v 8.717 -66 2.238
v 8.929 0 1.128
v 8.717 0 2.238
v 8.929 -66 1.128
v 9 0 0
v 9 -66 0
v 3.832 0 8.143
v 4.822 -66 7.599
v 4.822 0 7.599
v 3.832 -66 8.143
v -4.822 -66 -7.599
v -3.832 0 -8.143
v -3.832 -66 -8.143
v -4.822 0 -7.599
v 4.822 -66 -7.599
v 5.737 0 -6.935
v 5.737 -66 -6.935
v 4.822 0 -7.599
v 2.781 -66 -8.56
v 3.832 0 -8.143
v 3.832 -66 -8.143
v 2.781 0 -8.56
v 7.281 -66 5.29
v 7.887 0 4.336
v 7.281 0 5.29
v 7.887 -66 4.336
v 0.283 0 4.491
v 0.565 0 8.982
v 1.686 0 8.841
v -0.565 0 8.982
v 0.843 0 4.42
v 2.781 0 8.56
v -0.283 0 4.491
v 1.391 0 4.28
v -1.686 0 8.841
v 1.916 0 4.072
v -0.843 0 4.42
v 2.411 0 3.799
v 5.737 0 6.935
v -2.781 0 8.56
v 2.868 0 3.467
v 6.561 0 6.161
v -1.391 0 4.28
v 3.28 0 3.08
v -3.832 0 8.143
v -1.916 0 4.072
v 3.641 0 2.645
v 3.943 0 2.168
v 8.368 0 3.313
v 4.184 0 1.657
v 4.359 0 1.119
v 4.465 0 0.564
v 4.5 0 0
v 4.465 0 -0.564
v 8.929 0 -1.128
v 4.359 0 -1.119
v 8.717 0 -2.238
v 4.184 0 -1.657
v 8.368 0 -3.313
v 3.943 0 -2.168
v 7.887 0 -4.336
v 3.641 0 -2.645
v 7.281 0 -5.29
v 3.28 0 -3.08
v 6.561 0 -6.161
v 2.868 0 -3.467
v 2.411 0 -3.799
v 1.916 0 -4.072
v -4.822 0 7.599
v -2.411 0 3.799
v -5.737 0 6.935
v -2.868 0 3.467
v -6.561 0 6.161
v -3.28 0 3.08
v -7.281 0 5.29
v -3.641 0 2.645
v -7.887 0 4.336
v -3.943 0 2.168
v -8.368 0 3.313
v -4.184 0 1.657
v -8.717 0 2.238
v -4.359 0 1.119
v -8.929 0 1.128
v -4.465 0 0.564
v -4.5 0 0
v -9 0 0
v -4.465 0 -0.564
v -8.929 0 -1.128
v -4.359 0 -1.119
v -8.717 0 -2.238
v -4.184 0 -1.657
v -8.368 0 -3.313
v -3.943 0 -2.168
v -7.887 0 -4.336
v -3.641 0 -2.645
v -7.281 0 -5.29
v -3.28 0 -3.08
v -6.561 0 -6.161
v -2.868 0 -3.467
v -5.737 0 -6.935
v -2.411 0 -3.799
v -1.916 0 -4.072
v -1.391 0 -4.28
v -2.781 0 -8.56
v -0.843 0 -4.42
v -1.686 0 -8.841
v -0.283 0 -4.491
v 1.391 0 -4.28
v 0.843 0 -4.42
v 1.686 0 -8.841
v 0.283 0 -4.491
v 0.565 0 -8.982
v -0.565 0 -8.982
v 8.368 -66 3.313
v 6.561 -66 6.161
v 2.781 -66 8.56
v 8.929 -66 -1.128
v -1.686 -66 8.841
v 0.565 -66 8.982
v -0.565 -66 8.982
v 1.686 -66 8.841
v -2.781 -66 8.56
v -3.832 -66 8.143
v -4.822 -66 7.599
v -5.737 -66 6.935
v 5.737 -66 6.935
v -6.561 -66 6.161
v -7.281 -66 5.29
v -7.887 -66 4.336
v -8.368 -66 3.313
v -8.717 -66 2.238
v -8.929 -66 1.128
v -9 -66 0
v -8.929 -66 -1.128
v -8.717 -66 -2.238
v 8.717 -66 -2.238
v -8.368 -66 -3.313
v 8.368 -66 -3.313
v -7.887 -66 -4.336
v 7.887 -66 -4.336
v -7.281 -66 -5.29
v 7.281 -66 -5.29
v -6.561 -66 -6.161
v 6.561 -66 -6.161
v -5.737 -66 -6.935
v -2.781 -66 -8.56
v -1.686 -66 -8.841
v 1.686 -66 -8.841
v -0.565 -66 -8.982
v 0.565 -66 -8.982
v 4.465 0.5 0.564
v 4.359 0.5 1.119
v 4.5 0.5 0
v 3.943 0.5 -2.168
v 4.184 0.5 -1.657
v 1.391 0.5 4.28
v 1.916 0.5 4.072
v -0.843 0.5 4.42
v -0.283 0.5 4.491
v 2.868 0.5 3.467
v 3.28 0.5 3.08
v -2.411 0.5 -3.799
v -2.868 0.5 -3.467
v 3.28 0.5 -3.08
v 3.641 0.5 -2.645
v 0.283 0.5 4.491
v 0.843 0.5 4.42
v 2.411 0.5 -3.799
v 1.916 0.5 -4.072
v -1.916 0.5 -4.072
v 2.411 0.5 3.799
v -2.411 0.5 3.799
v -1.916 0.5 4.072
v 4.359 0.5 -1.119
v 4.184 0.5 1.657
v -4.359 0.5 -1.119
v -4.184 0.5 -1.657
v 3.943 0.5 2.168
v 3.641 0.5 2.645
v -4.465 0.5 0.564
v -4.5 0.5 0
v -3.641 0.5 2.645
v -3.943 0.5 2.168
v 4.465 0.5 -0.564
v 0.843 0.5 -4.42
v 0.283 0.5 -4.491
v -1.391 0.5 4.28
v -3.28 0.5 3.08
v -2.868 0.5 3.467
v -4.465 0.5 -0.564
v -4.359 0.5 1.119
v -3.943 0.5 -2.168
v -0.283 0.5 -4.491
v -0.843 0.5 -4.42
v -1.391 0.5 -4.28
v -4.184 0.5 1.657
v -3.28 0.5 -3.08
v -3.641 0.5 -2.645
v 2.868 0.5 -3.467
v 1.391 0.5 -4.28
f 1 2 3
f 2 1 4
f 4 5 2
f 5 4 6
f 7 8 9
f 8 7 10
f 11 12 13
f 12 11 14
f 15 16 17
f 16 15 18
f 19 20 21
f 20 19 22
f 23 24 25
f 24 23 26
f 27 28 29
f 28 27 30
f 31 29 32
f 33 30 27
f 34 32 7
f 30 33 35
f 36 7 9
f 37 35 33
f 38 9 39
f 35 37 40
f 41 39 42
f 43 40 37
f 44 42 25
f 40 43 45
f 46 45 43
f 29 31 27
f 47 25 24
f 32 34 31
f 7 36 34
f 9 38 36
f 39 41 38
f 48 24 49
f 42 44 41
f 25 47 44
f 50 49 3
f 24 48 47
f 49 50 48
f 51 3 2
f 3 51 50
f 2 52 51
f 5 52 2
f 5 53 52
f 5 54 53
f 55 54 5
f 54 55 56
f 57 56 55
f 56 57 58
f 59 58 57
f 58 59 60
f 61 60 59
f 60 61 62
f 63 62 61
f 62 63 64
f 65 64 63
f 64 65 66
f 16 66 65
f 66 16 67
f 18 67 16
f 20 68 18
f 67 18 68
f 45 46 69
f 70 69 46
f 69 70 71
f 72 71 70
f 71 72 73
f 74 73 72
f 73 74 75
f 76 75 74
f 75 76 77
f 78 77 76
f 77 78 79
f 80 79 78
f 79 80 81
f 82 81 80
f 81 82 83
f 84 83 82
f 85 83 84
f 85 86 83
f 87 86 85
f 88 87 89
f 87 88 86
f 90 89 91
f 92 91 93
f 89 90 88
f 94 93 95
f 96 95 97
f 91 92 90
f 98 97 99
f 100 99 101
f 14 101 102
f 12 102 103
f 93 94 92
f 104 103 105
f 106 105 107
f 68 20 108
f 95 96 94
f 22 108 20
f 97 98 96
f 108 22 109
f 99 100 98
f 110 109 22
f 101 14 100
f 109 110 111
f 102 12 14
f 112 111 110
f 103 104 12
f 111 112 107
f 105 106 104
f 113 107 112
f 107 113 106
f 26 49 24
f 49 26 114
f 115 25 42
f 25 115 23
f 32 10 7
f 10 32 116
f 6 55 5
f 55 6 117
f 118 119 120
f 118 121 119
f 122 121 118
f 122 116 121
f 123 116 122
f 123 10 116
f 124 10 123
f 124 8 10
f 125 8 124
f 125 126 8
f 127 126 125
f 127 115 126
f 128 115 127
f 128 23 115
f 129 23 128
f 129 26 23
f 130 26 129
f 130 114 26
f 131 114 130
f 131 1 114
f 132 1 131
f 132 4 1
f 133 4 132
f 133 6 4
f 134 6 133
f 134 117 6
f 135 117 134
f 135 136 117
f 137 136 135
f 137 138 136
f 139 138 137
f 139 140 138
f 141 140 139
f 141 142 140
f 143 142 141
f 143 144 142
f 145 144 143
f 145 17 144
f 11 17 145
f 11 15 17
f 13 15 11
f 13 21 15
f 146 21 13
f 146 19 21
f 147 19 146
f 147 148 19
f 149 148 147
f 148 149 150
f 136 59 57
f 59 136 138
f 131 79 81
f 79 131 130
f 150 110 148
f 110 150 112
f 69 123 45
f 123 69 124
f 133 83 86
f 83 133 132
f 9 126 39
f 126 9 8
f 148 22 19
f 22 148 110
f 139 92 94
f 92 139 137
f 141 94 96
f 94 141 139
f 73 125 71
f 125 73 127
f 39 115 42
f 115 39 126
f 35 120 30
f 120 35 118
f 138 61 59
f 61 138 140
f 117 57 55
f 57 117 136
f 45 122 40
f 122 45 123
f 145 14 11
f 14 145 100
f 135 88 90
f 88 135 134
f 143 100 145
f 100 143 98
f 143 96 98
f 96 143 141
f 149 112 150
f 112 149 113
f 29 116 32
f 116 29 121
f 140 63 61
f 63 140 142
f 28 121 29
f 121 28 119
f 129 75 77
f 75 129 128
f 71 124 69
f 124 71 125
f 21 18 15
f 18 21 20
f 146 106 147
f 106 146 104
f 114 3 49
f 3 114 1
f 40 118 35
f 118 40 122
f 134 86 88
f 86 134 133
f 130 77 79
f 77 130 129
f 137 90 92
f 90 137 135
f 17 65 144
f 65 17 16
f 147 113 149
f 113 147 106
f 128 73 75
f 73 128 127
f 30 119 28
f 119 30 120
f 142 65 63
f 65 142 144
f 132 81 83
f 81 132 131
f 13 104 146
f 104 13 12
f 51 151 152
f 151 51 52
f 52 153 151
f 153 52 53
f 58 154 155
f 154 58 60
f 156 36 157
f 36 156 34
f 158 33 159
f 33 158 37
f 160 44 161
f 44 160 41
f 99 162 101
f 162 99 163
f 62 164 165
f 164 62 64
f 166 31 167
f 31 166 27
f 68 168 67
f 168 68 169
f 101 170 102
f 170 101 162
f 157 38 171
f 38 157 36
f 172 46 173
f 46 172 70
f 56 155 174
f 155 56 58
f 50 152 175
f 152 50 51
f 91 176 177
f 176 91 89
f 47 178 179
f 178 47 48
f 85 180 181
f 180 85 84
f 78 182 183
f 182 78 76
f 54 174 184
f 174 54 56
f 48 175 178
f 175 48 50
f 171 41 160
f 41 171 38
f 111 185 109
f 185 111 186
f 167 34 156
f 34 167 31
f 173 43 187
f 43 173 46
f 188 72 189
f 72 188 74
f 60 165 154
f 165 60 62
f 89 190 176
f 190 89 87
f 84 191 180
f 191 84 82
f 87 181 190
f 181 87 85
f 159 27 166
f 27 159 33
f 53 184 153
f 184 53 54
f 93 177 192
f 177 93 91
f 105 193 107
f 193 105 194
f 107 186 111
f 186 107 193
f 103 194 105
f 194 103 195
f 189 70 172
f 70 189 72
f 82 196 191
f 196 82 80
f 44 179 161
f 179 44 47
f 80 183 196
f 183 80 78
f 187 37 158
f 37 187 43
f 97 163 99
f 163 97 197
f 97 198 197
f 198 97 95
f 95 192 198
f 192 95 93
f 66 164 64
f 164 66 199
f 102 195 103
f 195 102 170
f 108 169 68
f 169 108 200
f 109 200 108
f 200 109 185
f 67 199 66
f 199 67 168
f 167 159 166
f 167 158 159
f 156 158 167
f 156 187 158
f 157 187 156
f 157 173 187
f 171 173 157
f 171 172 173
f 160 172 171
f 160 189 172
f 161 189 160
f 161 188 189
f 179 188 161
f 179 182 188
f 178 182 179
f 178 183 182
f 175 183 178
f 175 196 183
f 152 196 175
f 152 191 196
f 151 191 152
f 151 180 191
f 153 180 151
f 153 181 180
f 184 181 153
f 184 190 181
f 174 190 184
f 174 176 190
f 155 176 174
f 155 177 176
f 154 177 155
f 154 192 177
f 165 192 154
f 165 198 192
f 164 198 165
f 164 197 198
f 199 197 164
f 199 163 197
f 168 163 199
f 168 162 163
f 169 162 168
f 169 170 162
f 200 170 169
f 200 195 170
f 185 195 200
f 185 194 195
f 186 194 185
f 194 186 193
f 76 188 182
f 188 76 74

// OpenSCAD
fn=50;

module battery_model()
{
    rotate([90, 0, 0])  union()
    {
        rotate([0, 0, 0])  translate([0, 0, 0])  cylinder(66, 9,9, $fn=fn);
        rotate([0, 0, 0])  translate([0, 0, -0.5])  cylinder(0.5, 4.5,4.5, $fn=fn);
    }
}

translate([0,0,0])battery_model();
   
